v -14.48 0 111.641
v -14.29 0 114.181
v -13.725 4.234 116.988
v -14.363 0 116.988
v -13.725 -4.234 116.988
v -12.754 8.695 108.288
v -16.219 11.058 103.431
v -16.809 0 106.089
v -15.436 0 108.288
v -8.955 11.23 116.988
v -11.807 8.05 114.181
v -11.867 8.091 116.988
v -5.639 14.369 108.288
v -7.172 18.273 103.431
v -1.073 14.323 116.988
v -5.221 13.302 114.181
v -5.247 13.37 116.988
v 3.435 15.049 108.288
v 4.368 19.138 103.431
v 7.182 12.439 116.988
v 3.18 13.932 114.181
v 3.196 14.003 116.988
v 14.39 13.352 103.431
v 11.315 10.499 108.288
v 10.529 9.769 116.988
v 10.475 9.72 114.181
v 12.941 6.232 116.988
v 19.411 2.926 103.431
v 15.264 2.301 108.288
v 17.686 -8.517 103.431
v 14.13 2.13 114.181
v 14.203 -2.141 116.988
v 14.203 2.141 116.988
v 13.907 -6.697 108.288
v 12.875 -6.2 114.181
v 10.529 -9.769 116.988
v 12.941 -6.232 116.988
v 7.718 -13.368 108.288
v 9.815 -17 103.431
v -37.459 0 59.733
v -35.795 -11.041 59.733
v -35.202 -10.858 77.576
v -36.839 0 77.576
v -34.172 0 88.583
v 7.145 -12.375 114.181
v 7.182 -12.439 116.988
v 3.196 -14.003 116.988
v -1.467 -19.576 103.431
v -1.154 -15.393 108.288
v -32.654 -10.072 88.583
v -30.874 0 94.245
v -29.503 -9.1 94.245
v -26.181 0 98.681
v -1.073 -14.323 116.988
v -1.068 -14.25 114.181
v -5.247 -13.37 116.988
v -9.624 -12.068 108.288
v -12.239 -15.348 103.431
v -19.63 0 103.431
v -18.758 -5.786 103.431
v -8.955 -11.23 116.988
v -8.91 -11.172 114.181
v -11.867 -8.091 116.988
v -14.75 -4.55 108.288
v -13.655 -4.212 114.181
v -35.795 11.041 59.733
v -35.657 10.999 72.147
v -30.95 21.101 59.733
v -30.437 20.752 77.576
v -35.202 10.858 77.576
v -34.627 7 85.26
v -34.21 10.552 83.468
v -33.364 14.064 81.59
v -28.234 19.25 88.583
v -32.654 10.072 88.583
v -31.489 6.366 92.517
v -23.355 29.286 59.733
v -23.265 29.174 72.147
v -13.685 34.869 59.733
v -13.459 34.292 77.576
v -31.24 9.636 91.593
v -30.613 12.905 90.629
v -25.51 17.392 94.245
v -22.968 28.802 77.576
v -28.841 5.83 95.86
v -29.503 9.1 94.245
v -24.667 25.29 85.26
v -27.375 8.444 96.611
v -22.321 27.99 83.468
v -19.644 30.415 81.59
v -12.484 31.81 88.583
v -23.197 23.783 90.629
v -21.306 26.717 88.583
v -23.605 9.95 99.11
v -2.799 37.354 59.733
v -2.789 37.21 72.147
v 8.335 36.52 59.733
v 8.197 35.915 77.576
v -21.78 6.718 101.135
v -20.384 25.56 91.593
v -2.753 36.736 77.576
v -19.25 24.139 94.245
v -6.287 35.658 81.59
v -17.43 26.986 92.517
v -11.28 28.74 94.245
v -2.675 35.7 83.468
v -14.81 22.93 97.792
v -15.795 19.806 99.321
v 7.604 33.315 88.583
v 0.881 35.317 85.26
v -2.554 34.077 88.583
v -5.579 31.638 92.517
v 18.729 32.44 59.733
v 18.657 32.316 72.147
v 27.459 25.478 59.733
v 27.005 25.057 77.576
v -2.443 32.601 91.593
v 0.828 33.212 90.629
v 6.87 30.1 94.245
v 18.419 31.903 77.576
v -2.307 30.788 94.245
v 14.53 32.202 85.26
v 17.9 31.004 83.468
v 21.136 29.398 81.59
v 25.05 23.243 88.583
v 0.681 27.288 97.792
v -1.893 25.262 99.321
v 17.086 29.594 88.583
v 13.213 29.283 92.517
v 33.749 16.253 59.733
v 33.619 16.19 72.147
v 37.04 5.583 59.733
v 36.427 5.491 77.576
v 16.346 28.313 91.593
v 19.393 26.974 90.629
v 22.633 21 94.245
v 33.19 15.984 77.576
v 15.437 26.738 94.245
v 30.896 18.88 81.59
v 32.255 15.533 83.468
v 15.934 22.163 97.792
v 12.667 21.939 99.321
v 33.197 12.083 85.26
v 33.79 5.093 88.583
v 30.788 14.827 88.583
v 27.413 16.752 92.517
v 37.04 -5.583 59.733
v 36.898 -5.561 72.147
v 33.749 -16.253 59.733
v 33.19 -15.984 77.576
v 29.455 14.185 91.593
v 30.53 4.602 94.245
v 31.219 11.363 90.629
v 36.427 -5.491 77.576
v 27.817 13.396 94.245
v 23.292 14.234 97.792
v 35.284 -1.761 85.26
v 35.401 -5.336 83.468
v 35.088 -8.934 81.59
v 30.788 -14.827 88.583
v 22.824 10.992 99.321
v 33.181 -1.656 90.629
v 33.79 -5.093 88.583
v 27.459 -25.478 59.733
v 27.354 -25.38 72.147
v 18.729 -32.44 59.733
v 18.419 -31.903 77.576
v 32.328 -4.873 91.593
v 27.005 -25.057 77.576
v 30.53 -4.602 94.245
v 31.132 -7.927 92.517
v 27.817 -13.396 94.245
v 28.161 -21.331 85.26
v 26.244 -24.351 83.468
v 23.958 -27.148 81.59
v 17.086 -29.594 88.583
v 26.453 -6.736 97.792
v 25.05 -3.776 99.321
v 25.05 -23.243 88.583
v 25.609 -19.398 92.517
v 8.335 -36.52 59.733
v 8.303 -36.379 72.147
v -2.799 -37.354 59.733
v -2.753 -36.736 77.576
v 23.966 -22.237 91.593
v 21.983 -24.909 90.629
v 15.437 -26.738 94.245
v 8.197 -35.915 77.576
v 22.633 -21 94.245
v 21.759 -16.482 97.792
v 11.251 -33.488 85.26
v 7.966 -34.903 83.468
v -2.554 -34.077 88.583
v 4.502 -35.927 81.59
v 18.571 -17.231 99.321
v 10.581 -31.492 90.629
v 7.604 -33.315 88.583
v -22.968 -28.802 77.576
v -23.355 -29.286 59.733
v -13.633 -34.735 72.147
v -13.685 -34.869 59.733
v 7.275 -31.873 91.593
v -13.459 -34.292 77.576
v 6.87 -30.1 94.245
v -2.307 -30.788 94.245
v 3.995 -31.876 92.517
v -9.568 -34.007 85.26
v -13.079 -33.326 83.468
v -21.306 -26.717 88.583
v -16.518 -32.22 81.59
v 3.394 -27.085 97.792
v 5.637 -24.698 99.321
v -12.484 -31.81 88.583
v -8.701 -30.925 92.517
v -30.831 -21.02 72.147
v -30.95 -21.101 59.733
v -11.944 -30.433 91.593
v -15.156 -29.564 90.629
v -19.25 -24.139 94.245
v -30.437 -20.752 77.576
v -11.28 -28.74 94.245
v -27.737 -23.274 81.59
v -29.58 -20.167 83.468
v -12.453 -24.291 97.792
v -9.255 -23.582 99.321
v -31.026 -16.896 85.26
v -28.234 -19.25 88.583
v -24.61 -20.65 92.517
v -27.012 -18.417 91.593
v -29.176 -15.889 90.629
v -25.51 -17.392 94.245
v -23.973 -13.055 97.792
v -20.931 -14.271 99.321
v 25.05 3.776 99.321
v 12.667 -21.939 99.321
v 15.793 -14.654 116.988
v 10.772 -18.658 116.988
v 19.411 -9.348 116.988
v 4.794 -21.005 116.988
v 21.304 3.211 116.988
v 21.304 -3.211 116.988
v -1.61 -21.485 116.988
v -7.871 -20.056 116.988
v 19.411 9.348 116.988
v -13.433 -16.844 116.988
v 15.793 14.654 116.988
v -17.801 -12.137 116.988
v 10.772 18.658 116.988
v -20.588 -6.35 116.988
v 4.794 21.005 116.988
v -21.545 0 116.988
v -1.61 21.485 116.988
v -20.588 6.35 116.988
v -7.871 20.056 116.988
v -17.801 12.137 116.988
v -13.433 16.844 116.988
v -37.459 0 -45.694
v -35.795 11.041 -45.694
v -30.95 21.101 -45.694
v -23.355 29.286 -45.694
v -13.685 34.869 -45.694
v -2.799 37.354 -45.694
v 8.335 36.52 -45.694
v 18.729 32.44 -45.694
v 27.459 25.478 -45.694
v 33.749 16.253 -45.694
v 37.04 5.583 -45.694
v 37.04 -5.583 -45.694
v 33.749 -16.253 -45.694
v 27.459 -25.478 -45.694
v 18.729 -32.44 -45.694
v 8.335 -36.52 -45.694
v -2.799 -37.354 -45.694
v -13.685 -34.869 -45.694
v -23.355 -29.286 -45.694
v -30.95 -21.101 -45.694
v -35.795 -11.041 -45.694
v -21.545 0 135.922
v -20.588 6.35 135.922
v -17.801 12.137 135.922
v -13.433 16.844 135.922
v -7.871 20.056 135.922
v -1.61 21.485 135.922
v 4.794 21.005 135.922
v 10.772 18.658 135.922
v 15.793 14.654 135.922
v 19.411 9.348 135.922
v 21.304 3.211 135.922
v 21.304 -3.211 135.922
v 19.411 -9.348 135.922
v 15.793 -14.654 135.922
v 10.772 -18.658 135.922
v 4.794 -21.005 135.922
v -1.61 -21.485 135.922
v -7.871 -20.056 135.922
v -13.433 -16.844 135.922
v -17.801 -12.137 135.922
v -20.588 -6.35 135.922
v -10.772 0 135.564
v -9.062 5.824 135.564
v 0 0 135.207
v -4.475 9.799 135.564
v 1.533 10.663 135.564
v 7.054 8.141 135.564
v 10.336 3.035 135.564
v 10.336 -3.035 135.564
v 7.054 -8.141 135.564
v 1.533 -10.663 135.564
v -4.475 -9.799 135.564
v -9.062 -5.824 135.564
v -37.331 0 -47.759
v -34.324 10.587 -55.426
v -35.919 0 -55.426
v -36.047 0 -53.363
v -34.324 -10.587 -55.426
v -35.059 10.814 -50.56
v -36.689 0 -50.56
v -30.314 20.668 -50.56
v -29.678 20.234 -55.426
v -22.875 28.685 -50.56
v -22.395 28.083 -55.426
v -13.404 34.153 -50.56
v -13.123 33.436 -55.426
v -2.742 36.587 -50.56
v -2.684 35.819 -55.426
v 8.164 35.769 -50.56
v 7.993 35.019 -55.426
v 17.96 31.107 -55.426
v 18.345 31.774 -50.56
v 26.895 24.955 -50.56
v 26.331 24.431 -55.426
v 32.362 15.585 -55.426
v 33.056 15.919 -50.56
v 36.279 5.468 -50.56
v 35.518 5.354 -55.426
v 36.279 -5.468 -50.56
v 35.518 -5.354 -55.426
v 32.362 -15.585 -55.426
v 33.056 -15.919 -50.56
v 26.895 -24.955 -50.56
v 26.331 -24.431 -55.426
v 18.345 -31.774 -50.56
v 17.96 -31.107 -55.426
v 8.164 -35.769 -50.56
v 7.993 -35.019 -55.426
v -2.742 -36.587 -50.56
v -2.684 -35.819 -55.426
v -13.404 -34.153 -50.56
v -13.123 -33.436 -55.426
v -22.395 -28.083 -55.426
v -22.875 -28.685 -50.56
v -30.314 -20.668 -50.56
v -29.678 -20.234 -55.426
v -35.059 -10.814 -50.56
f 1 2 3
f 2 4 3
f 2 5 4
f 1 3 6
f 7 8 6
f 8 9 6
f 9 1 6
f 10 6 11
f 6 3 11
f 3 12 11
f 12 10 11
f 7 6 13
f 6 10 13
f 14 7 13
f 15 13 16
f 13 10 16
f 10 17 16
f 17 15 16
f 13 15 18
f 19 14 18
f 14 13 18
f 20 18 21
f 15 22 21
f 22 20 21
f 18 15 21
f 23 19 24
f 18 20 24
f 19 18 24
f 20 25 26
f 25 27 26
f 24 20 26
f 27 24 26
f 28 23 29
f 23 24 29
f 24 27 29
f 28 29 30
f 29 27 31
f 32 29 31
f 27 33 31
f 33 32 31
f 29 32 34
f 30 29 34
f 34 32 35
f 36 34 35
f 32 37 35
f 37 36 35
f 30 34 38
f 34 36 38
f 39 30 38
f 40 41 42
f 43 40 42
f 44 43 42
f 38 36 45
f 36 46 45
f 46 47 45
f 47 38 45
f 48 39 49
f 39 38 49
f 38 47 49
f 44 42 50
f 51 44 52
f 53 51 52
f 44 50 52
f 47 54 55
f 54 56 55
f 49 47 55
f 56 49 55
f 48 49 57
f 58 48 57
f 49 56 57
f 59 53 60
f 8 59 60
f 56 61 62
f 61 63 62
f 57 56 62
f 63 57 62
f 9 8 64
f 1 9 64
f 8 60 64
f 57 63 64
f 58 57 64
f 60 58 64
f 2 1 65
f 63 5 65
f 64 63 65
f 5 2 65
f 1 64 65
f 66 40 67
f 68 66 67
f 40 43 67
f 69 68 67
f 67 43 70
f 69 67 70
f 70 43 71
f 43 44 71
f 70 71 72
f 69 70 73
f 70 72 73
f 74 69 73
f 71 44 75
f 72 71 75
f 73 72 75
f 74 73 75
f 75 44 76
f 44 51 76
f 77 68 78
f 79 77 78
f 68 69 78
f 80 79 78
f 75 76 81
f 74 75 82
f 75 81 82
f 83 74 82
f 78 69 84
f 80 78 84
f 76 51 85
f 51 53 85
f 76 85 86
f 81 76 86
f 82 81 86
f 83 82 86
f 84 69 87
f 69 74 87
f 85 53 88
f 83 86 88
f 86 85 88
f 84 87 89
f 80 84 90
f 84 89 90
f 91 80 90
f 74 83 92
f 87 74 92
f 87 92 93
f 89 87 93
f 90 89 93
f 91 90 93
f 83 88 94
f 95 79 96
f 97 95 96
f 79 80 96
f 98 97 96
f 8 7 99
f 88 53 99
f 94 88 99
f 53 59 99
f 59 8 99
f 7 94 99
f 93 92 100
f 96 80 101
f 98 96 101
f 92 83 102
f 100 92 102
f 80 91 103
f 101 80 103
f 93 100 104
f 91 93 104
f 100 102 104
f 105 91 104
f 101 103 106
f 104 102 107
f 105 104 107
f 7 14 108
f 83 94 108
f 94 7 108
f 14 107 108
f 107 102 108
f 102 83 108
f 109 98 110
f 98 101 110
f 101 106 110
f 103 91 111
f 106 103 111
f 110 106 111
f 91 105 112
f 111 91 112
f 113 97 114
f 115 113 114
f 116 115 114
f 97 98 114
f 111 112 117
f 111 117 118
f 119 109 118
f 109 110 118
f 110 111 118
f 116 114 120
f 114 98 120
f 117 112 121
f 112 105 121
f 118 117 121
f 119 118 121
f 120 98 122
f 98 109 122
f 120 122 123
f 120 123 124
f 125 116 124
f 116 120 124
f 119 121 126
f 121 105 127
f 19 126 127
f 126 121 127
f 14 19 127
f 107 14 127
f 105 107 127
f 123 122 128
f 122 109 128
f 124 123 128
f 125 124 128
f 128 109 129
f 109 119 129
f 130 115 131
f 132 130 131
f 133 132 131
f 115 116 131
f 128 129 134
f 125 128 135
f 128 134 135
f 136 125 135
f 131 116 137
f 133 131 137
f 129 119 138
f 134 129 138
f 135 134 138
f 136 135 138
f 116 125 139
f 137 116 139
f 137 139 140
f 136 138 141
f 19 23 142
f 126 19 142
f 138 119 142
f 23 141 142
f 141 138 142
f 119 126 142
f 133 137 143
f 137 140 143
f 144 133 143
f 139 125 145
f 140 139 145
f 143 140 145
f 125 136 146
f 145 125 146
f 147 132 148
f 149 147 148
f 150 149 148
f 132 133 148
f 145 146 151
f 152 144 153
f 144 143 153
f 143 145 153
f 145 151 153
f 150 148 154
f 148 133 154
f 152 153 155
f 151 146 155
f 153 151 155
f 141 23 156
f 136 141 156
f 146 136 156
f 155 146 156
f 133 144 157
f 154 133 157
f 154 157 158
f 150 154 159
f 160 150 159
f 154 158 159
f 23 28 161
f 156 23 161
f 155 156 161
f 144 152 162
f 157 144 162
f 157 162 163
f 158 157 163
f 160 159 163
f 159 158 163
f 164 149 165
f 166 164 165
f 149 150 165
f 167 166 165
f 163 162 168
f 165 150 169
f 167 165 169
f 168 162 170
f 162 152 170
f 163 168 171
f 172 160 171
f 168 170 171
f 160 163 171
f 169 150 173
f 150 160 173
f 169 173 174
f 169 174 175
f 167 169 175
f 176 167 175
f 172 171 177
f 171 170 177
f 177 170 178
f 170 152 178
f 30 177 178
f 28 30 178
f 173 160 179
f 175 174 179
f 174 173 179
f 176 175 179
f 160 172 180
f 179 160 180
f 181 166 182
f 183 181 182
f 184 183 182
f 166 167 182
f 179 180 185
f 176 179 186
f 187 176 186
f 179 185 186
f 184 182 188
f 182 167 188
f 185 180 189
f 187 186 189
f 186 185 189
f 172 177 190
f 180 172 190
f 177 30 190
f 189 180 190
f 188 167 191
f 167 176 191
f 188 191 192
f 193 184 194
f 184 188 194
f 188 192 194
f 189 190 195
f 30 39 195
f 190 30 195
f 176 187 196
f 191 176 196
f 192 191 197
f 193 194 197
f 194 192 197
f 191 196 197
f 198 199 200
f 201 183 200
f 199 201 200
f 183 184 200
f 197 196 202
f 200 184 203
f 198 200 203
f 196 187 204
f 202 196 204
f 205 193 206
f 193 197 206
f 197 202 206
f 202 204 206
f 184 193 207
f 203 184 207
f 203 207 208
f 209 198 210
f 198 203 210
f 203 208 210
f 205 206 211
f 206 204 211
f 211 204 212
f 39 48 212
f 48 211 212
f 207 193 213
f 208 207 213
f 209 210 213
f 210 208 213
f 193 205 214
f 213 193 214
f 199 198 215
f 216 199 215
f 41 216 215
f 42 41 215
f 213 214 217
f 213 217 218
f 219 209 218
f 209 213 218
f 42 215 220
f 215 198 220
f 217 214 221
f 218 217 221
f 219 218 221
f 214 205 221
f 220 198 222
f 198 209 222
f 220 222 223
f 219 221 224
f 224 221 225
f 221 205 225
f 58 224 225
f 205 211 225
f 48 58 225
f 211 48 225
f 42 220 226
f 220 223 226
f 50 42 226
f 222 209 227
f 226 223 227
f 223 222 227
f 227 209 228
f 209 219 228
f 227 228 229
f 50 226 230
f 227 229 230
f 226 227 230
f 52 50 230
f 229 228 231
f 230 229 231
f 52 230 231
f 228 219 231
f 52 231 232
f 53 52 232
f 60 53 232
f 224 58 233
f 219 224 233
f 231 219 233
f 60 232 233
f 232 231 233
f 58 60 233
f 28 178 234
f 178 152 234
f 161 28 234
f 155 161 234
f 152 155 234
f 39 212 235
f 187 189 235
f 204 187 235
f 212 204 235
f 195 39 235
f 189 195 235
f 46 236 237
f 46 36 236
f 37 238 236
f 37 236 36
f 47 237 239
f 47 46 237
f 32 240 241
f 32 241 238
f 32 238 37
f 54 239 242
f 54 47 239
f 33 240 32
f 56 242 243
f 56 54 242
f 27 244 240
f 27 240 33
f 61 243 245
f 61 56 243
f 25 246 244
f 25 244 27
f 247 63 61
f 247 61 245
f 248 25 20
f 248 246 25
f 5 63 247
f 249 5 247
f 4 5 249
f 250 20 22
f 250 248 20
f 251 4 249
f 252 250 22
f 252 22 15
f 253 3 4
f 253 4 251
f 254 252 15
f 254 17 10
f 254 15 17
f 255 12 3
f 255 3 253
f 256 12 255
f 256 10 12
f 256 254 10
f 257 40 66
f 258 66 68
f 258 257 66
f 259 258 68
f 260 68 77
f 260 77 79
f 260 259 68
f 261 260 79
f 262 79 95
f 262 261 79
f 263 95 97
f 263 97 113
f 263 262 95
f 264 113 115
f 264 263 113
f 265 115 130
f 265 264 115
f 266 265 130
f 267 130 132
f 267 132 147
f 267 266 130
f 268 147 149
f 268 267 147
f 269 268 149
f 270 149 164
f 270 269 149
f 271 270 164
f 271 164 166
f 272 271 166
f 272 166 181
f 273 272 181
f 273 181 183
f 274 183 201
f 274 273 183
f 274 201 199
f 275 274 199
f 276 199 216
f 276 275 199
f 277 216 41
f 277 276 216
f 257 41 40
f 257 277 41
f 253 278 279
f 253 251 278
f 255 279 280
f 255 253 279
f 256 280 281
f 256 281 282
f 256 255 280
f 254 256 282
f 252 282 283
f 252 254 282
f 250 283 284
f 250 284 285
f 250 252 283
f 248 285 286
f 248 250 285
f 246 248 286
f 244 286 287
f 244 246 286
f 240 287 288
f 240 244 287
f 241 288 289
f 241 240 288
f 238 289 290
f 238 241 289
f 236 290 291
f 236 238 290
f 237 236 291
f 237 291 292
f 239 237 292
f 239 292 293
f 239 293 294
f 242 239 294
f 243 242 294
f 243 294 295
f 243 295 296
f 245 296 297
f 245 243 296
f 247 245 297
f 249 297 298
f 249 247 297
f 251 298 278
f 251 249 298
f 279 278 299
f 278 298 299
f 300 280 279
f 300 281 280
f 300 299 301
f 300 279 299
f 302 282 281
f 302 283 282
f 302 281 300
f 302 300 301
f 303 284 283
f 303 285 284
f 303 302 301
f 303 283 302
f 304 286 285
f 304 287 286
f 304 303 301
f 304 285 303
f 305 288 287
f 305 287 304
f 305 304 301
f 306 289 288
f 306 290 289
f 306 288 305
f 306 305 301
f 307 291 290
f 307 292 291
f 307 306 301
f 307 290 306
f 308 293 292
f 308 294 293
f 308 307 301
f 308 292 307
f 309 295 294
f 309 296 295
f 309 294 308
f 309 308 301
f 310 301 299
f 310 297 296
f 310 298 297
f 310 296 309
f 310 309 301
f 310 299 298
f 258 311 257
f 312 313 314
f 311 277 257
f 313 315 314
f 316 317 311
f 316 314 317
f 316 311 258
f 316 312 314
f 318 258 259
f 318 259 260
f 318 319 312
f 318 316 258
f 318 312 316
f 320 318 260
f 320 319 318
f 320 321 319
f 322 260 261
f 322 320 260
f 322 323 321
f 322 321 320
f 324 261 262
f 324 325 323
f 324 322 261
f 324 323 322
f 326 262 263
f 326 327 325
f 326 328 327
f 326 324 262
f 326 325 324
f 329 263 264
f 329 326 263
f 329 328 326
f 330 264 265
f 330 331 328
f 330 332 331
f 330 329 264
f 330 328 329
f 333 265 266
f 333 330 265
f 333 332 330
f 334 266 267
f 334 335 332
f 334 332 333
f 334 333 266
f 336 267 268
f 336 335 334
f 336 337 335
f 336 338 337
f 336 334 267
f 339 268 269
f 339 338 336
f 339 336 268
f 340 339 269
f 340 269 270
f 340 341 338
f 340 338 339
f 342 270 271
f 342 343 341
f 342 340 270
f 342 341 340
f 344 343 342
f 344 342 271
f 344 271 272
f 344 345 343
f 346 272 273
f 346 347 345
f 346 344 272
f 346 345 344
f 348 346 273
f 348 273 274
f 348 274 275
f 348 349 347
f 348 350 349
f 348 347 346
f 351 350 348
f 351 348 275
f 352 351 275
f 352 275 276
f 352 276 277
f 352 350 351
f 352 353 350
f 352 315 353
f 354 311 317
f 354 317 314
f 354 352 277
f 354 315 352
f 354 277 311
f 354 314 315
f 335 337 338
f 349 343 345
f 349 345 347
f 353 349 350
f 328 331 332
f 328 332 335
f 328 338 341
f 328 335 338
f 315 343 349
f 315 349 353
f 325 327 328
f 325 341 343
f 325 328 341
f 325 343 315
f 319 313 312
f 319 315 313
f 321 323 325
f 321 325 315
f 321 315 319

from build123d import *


with BuildPart() as f1:
    # F0 (on Front) → F1 (revolve)
    with BuildSketch(Plane.XZ):
        with BuildLine():
            Line((-37.4588370323, 59.732876718), (-37.4588370323, 48.8092340529))
            Line((-37.4588370323, 48.8092340529), (-37.4588370323, -45.6943430106))
            add(Edge.make_bspline(
                [(-37.4588370323, -45.6943430106), (-37.6298800111, -48.9646402564), (-35.7483886182, -52.1555552913), (-35.919431597, -55.4258525372)],
                knots=[0, 0, 0, 0, 9.852514743, 9.852514743, 9.852514743, 9.852514743], degree=3))
            Line((-35.919431597, -55.4258525372), (0, -55.4258525372))
            Line((0, -55.4258525372), (0, 126.7814934254))
            Line((0, 126.7814934254), (0, 135.206669569))
            Line((0, 135.206669569), (-21.5448252857, 135.9217166901))
            Line((-21.5448252857, 135.9217166901), (-21.5448252857, 116.9883906841))
            Line((-21.5448252857, 116.9883906841), (-14.3632190302, 116.9883906841))
            add(Edge.make_bspline(
                [(-37.4588370323, 59.732876718), (-37.8051019347, 75.656499795), (-35.7428372279, 95.5439069808), (-14.945244298, 104.3960584298), (-14.0862612605, 112.3647683936), (-14.3632190302, 116.9883906841)],
                knots=[0, 0, 0, 0, 0.4379829854, 0.7509225673, 1, 1, 1, 1], degree=3))
        make_face()
    revolve(axis=Axis((0, 0, 35.6778204441), (0, 0, -1)))


solid = f1.part
